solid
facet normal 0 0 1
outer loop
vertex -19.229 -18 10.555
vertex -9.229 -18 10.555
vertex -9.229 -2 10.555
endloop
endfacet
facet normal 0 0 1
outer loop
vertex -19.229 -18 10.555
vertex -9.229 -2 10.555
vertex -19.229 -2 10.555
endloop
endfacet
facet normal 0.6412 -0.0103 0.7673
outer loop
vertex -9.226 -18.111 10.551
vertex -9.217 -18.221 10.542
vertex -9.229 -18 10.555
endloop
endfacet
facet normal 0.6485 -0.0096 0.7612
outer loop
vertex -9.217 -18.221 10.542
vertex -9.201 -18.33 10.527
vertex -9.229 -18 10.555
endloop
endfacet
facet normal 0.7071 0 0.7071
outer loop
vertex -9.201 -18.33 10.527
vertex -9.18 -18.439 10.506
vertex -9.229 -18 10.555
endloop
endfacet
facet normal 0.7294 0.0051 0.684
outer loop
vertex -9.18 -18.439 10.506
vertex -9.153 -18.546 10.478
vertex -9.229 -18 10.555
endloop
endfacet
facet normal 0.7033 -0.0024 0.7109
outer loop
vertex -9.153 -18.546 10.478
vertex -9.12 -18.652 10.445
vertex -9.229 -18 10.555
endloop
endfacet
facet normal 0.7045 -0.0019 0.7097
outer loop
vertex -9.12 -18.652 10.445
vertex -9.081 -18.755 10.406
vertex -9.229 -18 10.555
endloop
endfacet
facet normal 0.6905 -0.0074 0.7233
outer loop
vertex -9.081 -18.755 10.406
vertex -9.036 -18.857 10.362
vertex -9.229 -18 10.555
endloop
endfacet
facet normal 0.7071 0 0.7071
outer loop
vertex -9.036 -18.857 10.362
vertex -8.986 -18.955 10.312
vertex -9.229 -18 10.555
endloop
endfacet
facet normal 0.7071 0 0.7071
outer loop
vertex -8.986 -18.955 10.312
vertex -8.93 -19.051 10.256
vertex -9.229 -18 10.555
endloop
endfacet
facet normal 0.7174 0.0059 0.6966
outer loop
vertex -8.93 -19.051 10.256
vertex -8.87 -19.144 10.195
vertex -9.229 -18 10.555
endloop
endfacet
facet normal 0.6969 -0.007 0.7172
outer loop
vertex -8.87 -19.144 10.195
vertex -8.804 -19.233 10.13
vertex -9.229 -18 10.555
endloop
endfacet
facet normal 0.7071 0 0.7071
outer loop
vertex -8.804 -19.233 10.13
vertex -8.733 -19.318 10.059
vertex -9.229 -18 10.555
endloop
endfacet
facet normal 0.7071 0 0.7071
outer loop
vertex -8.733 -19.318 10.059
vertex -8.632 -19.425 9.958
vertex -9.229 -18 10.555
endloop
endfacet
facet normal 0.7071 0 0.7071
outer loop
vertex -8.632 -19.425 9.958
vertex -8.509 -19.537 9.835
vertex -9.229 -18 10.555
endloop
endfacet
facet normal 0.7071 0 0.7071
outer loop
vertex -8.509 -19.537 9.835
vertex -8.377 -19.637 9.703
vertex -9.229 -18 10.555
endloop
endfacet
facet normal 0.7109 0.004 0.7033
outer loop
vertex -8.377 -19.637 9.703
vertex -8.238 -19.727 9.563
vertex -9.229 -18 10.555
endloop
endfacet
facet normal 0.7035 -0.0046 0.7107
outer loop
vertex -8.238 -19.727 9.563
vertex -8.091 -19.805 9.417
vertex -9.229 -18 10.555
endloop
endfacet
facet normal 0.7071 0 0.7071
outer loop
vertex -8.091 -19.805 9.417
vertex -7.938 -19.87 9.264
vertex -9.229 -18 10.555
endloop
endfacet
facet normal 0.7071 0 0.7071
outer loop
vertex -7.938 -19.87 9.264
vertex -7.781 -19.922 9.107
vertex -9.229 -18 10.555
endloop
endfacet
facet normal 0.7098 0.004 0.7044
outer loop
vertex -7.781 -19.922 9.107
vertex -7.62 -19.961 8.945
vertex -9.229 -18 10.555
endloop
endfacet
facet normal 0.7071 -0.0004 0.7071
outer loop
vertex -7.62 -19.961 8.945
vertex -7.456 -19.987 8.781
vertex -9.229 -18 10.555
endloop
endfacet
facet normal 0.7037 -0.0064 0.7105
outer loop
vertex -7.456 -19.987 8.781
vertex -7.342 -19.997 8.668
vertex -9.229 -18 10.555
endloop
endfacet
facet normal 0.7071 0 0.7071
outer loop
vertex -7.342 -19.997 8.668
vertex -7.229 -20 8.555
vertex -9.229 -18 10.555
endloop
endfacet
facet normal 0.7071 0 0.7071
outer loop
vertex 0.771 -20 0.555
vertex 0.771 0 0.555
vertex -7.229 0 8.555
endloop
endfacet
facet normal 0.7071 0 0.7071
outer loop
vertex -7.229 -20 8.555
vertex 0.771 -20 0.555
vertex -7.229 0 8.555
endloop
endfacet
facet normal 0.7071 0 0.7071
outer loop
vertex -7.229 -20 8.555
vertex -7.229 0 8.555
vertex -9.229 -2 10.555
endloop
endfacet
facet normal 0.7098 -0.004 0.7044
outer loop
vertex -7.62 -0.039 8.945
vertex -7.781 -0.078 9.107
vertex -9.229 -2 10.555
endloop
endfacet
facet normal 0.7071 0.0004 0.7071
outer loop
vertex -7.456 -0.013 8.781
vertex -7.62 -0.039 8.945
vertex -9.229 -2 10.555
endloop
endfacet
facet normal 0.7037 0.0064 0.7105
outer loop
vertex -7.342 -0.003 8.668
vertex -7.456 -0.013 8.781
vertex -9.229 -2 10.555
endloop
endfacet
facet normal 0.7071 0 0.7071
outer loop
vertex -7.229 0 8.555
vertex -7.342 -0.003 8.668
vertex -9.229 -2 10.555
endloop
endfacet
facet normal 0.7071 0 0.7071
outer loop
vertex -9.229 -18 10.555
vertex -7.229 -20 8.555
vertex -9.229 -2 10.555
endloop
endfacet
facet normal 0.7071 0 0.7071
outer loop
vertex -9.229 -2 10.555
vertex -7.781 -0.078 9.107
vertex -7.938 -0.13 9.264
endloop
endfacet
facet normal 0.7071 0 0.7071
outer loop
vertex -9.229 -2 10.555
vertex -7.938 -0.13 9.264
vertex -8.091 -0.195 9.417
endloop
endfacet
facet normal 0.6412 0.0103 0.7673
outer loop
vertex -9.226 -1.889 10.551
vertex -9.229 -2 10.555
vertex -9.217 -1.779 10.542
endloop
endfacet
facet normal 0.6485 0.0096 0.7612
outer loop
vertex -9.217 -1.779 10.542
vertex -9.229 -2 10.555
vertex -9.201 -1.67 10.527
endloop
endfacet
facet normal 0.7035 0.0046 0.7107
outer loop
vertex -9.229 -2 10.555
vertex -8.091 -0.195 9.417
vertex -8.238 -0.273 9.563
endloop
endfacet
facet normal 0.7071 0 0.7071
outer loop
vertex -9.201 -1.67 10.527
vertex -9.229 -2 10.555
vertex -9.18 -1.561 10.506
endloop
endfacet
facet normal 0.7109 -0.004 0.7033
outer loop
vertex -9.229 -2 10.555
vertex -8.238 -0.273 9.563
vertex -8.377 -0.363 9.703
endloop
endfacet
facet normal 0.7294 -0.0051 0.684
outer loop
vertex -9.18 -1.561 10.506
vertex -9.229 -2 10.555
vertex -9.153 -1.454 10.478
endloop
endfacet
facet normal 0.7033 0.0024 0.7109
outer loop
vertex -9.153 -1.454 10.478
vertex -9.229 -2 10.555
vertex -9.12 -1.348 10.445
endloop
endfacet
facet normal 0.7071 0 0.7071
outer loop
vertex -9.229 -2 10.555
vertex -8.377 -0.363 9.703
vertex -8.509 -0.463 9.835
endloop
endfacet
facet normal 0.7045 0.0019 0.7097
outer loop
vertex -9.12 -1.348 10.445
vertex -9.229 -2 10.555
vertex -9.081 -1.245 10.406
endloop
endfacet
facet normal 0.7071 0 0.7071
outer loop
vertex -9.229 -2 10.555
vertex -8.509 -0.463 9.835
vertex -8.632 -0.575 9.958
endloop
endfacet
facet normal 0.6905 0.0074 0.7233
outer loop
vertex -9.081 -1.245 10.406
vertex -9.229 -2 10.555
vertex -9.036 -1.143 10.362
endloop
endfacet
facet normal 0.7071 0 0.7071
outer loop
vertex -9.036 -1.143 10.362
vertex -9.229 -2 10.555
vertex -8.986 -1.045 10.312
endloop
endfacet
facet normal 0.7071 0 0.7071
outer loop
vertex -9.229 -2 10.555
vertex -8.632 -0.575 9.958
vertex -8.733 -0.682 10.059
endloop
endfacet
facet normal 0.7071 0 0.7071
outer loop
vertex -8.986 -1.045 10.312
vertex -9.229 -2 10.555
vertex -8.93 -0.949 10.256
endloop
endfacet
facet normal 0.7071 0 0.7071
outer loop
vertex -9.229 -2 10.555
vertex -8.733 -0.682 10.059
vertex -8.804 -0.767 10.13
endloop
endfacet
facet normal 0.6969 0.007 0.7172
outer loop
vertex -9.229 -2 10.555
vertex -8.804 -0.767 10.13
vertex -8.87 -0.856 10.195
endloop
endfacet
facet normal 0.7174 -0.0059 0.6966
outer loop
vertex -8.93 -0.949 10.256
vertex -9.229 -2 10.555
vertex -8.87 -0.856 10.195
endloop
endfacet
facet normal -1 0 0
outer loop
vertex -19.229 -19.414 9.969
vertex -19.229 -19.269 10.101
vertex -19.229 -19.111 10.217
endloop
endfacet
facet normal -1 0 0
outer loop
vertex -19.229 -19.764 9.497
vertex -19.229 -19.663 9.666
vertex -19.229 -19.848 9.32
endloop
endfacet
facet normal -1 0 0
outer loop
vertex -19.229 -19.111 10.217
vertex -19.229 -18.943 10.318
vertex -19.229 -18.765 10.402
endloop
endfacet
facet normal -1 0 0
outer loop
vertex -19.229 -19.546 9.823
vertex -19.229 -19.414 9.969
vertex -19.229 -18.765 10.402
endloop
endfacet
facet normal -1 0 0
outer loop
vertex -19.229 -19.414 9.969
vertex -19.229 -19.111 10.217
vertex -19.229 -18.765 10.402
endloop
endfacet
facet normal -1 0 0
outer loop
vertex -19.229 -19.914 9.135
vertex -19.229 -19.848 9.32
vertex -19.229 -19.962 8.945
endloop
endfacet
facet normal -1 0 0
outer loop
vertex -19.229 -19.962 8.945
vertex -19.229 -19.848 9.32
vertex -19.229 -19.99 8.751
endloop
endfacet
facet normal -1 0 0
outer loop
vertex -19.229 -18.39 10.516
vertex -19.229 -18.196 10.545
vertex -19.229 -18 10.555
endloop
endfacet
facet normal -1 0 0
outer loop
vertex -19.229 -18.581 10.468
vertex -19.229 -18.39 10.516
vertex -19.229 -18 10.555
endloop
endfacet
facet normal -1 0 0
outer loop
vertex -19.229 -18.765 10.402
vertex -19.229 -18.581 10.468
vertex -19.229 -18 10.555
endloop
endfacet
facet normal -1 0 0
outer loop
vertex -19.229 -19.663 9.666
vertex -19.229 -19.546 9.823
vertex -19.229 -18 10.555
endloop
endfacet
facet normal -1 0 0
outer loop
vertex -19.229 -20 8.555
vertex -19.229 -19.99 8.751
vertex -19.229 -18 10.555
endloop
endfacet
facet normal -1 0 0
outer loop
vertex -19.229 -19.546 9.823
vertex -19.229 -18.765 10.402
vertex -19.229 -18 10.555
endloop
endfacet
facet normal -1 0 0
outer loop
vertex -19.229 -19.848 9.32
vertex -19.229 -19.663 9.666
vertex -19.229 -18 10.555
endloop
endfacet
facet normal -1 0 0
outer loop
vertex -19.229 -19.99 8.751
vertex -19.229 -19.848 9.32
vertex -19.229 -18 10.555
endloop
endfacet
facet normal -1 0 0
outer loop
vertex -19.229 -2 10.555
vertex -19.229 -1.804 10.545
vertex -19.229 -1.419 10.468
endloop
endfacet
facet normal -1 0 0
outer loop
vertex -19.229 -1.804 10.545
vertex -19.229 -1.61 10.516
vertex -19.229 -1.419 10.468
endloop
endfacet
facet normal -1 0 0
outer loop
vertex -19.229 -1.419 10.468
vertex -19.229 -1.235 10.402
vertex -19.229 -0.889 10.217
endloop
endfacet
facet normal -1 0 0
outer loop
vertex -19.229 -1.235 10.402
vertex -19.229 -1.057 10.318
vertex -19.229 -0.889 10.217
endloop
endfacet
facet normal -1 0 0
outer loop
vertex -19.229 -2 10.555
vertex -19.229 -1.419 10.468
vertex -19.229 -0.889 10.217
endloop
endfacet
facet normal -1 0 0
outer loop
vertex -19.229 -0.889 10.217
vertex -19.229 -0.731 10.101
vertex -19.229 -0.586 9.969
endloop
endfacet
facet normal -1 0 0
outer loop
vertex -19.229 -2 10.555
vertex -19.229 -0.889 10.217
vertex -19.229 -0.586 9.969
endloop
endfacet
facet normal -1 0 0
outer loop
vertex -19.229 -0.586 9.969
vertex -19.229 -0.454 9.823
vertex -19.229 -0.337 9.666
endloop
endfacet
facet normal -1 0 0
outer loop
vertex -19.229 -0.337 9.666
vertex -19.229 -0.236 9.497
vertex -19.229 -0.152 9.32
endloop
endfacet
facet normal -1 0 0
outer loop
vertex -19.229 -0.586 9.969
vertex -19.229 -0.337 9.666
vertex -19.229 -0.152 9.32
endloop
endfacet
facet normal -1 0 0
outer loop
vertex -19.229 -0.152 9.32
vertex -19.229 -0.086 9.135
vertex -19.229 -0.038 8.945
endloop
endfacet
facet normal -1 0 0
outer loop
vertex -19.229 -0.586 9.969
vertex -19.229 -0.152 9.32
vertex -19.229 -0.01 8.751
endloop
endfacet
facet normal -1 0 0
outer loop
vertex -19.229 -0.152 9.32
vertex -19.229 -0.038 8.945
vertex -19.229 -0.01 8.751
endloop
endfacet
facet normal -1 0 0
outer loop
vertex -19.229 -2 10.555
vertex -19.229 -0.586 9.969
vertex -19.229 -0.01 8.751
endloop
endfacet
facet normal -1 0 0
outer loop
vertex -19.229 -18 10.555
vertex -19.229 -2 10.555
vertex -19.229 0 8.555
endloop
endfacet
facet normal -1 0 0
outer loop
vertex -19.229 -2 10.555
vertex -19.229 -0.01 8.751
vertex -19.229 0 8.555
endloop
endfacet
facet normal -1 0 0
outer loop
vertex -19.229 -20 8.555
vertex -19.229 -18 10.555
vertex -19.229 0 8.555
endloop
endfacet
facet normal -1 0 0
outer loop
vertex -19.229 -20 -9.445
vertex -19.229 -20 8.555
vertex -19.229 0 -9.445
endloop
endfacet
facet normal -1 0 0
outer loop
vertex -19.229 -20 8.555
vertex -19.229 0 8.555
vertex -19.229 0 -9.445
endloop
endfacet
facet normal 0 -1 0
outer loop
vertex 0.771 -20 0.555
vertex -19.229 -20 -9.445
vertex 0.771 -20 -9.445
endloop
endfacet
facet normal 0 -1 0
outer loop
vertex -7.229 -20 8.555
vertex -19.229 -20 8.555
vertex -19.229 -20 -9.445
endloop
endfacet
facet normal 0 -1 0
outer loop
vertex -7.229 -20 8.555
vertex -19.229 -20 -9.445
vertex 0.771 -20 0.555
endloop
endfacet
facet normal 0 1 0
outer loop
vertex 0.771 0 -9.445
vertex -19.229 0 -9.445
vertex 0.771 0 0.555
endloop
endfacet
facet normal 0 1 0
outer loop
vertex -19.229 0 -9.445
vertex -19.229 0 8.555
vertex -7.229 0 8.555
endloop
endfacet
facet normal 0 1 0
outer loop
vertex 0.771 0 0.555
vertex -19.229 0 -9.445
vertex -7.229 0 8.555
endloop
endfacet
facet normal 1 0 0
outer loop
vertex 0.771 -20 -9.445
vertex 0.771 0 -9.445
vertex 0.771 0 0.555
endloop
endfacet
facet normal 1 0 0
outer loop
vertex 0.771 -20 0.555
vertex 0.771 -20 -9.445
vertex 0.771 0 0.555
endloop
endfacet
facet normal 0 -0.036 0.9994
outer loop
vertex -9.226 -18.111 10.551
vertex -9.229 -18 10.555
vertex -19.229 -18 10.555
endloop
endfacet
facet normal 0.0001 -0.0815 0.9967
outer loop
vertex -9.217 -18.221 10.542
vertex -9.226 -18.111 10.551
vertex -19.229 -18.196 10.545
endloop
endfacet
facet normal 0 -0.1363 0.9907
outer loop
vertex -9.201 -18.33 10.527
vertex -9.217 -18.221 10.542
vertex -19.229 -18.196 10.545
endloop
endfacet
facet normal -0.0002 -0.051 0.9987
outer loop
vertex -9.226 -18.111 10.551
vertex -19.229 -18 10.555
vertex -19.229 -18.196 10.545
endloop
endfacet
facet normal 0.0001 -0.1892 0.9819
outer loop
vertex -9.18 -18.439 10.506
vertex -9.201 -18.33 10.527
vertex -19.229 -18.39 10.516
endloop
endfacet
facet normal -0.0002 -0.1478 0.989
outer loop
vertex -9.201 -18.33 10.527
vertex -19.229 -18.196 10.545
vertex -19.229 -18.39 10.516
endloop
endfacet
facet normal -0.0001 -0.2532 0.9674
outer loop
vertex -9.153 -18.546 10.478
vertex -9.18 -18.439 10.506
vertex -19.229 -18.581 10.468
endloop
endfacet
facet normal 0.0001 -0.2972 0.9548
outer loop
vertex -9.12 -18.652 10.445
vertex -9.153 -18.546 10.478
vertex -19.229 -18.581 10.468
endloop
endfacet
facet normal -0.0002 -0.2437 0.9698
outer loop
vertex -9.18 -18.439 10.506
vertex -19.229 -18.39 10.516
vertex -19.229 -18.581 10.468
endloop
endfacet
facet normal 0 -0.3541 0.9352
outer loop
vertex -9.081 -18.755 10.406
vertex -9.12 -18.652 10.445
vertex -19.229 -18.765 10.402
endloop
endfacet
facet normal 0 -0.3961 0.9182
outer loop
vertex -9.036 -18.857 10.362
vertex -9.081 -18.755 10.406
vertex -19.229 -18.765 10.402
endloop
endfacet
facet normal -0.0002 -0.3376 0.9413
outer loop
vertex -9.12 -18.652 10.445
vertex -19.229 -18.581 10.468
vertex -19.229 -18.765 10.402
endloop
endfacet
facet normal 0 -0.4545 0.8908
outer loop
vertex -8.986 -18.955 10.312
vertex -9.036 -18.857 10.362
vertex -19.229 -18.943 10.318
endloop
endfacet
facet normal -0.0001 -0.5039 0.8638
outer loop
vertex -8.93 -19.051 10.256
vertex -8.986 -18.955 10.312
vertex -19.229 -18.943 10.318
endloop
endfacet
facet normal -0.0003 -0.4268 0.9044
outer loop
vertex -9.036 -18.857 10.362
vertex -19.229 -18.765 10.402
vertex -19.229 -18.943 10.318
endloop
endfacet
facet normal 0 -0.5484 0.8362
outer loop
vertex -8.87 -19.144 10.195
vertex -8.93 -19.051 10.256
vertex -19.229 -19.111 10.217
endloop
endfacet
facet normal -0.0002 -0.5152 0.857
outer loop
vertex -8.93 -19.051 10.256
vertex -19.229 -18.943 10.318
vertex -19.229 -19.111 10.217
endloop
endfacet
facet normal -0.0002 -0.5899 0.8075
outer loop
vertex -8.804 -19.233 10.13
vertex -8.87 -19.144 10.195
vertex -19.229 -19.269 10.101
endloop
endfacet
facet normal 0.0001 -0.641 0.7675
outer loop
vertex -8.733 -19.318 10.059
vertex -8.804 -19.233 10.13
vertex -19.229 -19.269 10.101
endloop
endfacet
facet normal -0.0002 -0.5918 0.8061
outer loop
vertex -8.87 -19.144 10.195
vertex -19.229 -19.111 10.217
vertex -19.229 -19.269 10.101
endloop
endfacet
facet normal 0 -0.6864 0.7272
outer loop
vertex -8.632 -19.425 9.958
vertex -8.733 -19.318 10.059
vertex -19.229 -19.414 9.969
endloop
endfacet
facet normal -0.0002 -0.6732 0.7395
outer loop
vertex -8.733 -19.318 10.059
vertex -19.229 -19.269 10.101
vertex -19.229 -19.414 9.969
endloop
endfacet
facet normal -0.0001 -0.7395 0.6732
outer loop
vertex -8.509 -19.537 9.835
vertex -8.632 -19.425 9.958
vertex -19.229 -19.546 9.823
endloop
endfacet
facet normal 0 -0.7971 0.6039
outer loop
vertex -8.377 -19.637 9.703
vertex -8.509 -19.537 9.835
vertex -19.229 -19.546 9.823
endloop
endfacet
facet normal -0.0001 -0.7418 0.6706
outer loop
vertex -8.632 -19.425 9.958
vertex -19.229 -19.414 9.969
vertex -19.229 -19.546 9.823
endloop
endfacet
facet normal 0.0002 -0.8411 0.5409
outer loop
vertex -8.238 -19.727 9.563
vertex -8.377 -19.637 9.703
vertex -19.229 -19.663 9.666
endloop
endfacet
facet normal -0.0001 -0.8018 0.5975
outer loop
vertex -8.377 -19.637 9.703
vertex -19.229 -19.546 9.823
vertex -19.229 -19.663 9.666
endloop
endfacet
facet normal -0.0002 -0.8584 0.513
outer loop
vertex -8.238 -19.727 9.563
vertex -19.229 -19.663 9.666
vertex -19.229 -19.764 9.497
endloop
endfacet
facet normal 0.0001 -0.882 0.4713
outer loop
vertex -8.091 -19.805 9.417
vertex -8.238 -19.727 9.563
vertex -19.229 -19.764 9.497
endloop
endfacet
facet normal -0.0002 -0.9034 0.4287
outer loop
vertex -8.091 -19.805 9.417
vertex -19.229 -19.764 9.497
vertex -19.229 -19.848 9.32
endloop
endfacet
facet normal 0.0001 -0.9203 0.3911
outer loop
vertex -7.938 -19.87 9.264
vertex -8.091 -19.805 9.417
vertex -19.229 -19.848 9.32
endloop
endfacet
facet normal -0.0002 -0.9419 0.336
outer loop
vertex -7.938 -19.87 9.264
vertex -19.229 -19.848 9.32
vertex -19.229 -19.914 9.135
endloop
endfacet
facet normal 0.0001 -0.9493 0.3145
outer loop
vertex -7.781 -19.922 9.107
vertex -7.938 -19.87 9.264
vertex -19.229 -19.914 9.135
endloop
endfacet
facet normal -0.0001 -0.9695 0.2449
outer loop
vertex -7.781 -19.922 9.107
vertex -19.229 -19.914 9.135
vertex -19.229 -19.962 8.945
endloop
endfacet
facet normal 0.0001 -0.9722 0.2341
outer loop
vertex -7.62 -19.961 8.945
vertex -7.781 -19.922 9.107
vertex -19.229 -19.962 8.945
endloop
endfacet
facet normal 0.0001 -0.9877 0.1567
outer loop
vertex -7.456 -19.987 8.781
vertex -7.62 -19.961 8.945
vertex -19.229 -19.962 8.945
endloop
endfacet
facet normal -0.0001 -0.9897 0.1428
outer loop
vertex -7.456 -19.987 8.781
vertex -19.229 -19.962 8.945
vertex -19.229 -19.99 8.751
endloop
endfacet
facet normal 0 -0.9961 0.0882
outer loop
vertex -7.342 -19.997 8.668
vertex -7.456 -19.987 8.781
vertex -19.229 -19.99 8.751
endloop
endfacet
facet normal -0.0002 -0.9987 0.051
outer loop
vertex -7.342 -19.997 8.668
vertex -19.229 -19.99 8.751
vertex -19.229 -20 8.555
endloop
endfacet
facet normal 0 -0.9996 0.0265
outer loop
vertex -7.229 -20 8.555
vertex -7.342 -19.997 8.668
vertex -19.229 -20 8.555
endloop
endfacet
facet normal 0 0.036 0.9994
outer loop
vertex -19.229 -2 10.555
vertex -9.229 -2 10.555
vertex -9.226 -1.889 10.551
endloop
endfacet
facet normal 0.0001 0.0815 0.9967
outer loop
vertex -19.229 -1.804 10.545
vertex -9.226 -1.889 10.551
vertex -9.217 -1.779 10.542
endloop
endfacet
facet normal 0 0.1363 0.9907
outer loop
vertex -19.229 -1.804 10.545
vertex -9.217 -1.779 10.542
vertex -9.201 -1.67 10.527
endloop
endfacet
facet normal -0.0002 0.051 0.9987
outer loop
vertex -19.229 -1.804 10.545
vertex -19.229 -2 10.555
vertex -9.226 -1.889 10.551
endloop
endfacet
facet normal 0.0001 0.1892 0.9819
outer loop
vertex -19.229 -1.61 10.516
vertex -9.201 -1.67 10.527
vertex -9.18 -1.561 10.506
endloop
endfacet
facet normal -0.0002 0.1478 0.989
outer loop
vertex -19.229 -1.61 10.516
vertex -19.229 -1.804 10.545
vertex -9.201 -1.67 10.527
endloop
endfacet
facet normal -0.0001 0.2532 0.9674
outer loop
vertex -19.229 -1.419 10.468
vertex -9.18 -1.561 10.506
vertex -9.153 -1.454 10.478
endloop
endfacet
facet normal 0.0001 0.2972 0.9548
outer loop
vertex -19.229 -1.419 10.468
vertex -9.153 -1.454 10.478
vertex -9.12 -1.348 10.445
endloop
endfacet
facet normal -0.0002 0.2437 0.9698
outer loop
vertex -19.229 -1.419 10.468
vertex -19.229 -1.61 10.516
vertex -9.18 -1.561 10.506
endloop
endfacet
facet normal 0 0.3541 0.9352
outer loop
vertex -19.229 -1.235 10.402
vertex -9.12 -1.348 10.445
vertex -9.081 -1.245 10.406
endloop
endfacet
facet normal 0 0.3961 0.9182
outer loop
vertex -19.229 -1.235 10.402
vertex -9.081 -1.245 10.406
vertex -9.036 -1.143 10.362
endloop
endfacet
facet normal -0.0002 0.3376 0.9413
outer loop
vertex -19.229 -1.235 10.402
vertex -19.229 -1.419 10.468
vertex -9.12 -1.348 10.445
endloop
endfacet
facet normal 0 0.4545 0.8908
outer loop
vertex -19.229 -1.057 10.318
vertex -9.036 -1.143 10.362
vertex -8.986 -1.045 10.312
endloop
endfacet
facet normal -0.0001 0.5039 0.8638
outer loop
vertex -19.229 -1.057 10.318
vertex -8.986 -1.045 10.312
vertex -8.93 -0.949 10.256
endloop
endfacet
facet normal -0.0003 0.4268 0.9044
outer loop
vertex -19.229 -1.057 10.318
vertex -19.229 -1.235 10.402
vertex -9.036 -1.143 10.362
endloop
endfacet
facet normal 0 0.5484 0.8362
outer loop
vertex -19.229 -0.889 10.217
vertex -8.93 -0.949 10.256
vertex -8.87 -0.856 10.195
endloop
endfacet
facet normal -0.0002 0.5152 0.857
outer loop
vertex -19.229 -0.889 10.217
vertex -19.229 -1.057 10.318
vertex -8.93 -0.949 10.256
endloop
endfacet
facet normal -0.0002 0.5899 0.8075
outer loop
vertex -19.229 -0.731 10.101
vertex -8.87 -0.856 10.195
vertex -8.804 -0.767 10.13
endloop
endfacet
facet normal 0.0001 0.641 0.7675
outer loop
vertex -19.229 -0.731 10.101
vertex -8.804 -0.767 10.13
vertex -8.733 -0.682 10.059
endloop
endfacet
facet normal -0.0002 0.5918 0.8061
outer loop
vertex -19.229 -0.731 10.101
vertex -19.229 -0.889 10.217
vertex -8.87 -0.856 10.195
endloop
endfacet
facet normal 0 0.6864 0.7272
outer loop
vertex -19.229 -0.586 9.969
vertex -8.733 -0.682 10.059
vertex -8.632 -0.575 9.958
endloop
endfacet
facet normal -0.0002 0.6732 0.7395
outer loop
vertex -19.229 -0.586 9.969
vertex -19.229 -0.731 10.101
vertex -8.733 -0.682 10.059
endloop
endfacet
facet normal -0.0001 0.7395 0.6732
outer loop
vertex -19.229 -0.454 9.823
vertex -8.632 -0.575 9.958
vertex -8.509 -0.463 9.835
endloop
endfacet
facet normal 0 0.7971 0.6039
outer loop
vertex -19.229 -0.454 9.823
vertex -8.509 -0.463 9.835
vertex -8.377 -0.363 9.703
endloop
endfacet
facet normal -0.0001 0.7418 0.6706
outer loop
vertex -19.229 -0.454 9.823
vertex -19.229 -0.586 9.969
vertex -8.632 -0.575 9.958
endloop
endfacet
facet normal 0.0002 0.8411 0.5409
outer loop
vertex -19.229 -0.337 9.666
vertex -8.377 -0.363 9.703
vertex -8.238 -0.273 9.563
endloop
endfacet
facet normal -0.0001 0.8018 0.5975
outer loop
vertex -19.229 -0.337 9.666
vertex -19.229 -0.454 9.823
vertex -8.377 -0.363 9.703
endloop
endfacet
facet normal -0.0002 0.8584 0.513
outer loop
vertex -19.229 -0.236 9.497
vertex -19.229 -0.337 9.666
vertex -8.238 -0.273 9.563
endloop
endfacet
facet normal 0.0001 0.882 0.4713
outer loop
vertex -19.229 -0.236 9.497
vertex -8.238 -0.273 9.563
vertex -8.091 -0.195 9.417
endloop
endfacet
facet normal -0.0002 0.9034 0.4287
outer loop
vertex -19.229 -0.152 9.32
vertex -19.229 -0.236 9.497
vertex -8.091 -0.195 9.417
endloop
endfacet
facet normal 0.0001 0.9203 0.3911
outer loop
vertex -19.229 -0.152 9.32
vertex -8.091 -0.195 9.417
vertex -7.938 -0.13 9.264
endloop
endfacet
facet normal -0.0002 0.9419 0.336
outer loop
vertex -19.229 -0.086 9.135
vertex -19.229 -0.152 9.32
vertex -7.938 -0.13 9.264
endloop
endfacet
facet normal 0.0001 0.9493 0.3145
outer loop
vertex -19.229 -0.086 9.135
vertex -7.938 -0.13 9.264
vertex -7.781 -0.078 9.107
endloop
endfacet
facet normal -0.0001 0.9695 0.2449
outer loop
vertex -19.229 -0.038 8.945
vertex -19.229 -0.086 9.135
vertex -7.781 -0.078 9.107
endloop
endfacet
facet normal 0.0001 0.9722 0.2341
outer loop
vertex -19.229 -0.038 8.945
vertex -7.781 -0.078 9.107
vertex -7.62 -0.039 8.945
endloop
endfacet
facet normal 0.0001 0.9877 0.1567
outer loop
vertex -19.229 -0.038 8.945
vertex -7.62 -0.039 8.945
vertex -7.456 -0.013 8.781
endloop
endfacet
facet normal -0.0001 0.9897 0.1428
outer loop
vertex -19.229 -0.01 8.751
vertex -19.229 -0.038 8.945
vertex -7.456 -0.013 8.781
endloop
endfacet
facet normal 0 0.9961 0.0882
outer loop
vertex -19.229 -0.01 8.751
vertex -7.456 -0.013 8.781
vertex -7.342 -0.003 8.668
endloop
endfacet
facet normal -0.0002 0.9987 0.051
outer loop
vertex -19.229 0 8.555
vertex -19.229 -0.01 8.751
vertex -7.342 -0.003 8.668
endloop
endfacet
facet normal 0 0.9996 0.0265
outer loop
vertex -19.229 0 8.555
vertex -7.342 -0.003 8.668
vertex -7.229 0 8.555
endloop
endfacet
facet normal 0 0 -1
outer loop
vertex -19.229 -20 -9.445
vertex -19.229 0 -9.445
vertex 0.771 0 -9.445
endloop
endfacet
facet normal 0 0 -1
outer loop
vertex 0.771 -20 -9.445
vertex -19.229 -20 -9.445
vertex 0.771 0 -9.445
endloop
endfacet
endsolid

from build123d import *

# Parameters (mm, degrees)
F1_DEPTH = 20
F2_R     = 2


with BuildPart() as f1:
    # F0 (on Front) → F1 (new body)
    with BuildSketch(Plane.XZ):
        Polygon((-19.228746, -9.445448), (0.771254, -9.445448), (0.771254, 0.554552), (-9.228746, 10.554552), (-19.228746, 10.554552), align=None)
    extrude(amount=F1_DEPTH)

    # F2
    f2_edges = [f1.edges().sort_by_distance(p)[0] for p in [
        (-14.228746, 0, 10.554552),
        (-14.228746, -20, 10.554552),
    ]]
    fillet(f2_edges, radius=F2_R)


solid = f1.part
